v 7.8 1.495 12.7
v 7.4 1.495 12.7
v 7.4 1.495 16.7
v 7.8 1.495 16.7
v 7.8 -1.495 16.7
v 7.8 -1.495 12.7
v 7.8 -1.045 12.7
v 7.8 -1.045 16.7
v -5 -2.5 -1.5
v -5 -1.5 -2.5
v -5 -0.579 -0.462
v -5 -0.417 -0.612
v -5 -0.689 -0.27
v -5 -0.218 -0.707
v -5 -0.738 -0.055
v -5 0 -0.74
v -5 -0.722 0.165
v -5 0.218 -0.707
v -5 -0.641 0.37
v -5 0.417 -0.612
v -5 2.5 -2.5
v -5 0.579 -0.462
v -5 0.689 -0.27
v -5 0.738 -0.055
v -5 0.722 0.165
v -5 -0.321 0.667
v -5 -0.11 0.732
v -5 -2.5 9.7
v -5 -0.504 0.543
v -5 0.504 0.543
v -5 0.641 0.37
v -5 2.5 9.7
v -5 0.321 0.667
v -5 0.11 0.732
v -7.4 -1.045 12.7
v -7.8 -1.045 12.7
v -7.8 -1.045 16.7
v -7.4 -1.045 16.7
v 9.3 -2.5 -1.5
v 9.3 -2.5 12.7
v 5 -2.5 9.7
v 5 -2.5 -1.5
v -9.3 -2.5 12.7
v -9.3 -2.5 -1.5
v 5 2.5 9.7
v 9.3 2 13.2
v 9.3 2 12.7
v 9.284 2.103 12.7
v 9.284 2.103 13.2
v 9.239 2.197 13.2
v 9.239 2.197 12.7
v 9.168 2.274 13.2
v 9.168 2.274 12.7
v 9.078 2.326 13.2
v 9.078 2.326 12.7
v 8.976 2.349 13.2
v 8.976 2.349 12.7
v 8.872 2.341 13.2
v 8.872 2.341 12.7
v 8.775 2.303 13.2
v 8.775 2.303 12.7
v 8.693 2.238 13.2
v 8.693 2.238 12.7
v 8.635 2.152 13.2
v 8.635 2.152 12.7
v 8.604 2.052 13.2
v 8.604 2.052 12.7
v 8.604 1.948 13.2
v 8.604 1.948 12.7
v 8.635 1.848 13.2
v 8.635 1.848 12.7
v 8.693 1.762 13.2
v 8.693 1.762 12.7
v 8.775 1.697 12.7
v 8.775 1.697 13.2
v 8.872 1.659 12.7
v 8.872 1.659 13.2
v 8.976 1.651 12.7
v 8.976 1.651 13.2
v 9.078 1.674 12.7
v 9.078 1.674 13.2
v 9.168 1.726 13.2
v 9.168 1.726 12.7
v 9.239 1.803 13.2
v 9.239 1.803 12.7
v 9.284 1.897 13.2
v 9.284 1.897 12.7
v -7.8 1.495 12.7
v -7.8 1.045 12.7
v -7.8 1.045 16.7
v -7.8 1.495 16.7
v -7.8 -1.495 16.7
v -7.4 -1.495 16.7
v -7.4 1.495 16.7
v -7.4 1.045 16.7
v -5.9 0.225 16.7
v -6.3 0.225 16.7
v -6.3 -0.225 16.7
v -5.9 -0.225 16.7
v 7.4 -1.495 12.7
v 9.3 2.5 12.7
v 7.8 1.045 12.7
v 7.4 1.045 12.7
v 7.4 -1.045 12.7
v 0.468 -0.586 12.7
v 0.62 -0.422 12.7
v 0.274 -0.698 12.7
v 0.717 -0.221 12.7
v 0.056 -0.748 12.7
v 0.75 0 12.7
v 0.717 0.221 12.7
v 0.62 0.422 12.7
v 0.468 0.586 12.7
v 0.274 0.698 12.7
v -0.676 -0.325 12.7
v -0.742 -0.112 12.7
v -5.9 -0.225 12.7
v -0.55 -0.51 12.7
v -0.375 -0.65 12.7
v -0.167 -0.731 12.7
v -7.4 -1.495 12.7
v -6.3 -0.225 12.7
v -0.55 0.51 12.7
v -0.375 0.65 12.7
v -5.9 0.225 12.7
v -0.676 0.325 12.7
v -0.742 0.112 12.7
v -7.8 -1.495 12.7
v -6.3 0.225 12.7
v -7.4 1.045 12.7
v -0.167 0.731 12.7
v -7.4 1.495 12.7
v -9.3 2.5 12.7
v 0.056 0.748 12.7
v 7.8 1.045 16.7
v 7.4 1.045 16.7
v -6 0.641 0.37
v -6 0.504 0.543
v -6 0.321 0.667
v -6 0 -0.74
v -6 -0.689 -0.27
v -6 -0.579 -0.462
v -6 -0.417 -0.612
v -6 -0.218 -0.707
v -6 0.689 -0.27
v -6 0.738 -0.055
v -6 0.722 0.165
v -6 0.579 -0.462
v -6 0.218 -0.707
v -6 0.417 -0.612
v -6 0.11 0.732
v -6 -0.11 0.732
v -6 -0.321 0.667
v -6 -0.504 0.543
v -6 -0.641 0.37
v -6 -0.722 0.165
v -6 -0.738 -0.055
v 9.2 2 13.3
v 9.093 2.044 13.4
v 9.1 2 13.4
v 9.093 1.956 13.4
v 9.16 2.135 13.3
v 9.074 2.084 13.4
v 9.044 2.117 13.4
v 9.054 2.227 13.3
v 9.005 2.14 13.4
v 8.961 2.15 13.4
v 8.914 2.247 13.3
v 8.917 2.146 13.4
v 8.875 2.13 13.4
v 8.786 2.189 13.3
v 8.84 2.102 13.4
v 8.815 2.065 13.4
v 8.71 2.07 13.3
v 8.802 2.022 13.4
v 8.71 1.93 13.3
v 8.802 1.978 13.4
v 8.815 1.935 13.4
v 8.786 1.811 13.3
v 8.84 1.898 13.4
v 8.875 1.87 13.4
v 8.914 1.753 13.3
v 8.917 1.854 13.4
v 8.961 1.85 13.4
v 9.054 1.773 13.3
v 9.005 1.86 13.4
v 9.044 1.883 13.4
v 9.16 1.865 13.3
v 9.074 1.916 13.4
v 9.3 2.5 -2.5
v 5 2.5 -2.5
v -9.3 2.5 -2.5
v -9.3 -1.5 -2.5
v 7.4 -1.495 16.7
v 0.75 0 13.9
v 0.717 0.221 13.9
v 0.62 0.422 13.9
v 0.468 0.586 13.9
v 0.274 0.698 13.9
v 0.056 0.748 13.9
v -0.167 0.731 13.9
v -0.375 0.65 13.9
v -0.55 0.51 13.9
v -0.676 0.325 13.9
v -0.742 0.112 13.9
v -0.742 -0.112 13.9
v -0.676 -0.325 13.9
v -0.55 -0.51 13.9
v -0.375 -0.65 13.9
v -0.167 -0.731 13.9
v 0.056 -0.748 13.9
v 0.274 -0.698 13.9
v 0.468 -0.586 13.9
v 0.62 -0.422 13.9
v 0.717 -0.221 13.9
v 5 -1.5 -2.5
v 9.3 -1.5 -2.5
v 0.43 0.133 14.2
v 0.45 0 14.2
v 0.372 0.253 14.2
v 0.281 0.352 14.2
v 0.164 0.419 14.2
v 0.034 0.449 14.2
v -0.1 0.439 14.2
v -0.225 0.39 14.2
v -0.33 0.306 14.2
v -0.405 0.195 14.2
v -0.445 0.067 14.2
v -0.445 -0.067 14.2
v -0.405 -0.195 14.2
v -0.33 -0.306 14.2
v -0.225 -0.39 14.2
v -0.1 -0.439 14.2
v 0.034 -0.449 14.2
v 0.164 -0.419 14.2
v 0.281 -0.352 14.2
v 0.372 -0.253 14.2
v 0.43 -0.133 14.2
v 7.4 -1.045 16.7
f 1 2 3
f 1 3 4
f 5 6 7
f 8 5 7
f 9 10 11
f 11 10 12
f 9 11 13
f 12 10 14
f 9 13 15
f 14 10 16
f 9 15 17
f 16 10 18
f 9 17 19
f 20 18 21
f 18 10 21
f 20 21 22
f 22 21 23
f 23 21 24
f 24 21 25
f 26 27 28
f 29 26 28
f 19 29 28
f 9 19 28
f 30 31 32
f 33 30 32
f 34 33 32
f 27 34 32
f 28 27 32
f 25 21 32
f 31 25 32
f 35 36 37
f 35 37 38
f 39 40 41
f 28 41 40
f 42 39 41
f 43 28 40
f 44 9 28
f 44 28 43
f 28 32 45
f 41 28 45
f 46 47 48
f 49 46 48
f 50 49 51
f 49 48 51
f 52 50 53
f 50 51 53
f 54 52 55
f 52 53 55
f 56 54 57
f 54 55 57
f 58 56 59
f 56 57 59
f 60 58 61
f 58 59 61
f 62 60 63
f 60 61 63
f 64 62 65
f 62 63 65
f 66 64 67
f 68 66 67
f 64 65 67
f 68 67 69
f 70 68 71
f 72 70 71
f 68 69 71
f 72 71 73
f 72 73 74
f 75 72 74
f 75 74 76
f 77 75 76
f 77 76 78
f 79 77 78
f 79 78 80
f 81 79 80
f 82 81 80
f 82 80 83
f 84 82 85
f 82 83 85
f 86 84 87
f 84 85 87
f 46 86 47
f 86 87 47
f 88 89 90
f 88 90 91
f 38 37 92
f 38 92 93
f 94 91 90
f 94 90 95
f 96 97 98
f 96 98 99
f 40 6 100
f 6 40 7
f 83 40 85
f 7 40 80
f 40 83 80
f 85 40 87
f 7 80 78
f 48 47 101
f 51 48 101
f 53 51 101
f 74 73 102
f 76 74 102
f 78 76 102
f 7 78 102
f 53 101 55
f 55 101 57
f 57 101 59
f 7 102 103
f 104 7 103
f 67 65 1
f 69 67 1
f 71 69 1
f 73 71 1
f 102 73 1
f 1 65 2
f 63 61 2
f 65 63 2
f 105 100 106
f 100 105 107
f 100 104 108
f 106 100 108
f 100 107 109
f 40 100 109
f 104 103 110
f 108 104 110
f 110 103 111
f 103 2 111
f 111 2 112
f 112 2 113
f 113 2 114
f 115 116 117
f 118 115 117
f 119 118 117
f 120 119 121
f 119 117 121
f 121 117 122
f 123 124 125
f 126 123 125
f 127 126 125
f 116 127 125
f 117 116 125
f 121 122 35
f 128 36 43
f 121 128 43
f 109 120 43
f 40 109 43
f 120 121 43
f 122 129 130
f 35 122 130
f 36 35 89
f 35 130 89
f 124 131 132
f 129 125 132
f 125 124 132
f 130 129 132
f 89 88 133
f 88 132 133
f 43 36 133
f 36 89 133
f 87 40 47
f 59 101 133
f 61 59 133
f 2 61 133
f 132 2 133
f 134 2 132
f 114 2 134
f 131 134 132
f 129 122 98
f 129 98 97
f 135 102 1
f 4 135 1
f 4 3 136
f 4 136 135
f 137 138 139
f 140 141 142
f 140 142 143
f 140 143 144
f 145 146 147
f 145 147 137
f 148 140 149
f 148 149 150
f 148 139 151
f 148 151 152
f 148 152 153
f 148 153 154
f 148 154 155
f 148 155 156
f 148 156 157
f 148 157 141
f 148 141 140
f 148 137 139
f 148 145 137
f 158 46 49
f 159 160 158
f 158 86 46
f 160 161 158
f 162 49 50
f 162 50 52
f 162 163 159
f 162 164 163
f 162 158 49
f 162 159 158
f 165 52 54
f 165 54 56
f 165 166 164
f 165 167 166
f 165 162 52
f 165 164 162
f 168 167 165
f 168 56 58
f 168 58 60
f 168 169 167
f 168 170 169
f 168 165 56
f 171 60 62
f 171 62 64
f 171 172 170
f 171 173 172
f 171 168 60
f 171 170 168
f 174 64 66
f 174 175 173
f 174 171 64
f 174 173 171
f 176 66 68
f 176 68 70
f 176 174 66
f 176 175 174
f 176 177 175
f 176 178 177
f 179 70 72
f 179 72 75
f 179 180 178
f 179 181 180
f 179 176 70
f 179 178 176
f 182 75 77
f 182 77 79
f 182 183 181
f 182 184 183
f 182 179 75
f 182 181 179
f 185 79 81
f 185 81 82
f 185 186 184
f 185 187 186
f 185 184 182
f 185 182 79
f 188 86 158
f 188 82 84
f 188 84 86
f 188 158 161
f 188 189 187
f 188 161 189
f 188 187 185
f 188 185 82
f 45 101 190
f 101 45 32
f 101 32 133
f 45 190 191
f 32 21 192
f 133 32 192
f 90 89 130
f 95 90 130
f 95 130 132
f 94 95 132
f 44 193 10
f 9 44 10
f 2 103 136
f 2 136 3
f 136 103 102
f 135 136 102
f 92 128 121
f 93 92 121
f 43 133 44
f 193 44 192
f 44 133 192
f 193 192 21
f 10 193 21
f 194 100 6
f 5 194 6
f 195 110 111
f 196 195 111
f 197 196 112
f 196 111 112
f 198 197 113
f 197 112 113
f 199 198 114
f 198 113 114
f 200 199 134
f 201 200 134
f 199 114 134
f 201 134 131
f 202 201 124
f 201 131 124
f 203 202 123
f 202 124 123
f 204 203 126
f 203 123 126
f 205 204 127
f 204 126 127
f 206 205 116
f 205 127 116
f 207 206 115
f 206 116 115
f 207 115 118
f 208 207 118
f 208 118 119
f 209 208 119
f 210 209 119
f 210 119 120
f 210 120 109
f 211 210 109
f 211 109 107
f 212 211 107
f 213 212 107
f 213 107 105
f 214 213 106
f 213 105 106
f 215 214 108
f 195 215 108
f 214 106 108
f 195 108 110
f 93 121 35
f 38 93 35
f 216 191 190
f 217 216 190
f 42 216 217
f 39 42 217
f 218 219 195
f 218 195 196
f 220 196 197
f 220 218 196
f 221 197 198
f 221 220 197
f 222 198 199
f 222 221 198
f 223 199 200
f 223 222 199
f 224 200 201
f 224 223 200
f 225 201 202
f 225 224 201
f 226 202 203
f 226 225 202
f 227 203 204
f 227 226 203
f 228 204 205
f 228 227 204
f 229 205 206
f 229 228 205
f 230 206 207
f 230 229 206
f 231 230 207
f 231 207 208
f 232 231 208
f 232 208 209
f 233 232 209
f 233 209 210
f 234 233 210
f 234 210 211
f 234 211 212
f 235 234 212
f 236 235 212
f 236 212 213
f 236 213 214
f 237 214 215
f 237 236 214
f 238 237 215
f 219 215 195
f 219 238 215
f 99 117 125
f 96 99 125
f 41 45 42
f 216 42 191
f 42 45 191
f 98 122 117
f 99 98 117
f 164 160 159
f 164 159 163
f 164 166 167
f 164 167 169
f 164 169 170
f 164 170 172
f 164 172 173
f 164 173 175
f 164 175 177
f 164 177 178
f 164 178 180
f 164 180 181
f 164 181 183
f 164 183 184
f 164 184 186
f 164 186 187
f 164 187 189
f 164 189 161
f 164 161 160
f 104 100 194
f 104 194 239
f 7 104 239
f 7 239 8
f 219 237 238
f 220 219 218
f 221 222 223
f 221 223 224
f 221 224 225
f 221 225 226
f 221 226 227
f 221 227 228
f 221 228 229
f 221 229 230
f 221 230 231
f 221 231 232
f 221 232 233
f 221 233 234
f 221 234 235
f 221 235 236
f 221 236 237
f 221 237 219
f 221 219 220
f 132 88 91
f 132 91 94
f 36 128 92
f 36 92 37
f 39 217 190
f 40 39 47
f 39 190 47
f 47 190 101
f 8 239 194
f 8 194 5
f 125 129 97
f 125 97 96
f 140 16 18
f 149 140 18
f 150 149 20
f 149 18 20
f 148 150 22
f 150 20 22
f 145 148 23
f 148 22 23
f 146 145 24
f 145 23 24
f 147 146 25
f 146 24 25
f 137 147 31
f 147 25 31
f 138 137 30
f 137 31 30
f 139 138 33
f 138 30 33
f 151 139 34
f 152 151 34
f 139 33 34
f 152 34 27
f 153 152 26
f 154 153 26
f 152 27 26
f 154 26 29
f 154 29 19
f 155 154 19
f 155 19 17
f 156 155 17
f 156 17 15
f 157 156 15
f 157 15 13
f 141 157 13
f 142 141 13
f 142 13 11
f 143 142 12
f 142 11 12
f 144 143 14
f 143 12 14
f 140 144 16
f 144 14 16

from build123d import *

# Parameters (mm, degrees)
BOSS_EXTRUDE1_DEPTH = 2.5
SKETCH3_R           = 0.75
BOSS_EXTRUDE2_DEPTH = 1.5
SKETCH4_R           = 0.35
BOSS_EXTRUDE3_DEPTH = 0.7
CHAMFER1_SIZE       = 0.2
CHAMFER2_SIZE       = 0.3
CHAMFER3_SIZE       = 1
SKETCH5_W           = 0.4
SKETCH5_H           = 0.45
BOSS_EXTRUDE4_DEPTH = 4
SKETCH6_R           = 0.740287865
CUT_EXTRUDE1_DEPTH  = 1


with BuildPart() as part:
    # Sketch1 → Boss-Extrude1 (new body, symmetric)
    with BuildSketch(Plane(origin=(0, 0, 0), x_dir=(1, 0, 0), z_dir=(0, 1, 0))):
        Polygon((5, 2.5), (9.3, 2.5), (9.3, -12.7), (-9.3, -12.7), (-9.3, 2.5), (-5, 2.5), (-5, -9.7), (5, -9.7), align=None)
    extrude(amount=BOSS_EXTRUDE1_DEPTH, both=True)

    # Sketch3 → Boss-Extrude2 (add)
    with BuildSketch(Plane.XY.offset(12.7)):
        Circle(SKETCH3_R)
    extrude(amount=BOSS_EXTRUDE2_DEPTH)

    # Sketch4 → Boss-Extrude3 (add)
    with BuildSketch(Plane.XY.offset(12.7)):
        with Locations((8.95, 2)):
            Circle(SKETCH4_R)
    extrude(amount=BOSS_EXTRUDE3_DEPTH)

    # Chamfer1
    chamfer1_edges = [part.edges().sort_by_distance(p)[0] for p in [
        (8.6, 2, 13.4),
    ]]
    chamfer(chamfer1_edges, length=CHAMFER1_SIZE)

    # Chamfer2
    chamfer2_edges = [part.edges().sort_by_distance(p)[0] for p in [
        (-0.75, 0, 14.2),
    ]]
    chamfer(chamfer2_edges, length=CHAMFER2_SIZE)

    # Chamfer3
    chamfer3_edges = [part.edges().sort_by_distance(p)[0] for p in [
        (-7.15, -2.5, -2.5),
        (7.15, -2.5, -2.5),
    ]]
    chamfer(chamfer3_edges, length=CHAMFER3_SIZE)

    # Sketch5 → Boss-Extrude4 (add)
    with BuildSketch(Plane.XY.offset(12.7)):
        with Locations((-7.6, 1.27)):
            Rectangle(SKETCH5_W, SKETCH5_H)
        with Locations((-7.6, -1.27)):
            Rectangle(SKETCH5_W, SKETCH5_H)
        with Locations((-6.1, 0)):
            Rectangle(SKETCH5_W, SKETCH5_H)
        with Locations((7.6, 1.27)):
            Rectangle(SKETCH5_W, SKETCH5_H)
        with Locations((7.6, -1.27)):
            Rectangle(SKETCH5_W, SKETCH5_H)
    extrude(amount=BOSS_EXTRUDE4_DEPTH)

    # Sketch6 → Cut-Extrude1 (cut)
    with BuildSketch(Plane(origin=(-5, 0, 0), x_dir=(0, 0, -1), z_dir=(1, 0, 0))):
        Circle(SKETCH6_R)
    extrude(amount=-CUT_EXTRUDE1_DEPTH, mode=Mode.SUBTRACT)


solid = part.part
